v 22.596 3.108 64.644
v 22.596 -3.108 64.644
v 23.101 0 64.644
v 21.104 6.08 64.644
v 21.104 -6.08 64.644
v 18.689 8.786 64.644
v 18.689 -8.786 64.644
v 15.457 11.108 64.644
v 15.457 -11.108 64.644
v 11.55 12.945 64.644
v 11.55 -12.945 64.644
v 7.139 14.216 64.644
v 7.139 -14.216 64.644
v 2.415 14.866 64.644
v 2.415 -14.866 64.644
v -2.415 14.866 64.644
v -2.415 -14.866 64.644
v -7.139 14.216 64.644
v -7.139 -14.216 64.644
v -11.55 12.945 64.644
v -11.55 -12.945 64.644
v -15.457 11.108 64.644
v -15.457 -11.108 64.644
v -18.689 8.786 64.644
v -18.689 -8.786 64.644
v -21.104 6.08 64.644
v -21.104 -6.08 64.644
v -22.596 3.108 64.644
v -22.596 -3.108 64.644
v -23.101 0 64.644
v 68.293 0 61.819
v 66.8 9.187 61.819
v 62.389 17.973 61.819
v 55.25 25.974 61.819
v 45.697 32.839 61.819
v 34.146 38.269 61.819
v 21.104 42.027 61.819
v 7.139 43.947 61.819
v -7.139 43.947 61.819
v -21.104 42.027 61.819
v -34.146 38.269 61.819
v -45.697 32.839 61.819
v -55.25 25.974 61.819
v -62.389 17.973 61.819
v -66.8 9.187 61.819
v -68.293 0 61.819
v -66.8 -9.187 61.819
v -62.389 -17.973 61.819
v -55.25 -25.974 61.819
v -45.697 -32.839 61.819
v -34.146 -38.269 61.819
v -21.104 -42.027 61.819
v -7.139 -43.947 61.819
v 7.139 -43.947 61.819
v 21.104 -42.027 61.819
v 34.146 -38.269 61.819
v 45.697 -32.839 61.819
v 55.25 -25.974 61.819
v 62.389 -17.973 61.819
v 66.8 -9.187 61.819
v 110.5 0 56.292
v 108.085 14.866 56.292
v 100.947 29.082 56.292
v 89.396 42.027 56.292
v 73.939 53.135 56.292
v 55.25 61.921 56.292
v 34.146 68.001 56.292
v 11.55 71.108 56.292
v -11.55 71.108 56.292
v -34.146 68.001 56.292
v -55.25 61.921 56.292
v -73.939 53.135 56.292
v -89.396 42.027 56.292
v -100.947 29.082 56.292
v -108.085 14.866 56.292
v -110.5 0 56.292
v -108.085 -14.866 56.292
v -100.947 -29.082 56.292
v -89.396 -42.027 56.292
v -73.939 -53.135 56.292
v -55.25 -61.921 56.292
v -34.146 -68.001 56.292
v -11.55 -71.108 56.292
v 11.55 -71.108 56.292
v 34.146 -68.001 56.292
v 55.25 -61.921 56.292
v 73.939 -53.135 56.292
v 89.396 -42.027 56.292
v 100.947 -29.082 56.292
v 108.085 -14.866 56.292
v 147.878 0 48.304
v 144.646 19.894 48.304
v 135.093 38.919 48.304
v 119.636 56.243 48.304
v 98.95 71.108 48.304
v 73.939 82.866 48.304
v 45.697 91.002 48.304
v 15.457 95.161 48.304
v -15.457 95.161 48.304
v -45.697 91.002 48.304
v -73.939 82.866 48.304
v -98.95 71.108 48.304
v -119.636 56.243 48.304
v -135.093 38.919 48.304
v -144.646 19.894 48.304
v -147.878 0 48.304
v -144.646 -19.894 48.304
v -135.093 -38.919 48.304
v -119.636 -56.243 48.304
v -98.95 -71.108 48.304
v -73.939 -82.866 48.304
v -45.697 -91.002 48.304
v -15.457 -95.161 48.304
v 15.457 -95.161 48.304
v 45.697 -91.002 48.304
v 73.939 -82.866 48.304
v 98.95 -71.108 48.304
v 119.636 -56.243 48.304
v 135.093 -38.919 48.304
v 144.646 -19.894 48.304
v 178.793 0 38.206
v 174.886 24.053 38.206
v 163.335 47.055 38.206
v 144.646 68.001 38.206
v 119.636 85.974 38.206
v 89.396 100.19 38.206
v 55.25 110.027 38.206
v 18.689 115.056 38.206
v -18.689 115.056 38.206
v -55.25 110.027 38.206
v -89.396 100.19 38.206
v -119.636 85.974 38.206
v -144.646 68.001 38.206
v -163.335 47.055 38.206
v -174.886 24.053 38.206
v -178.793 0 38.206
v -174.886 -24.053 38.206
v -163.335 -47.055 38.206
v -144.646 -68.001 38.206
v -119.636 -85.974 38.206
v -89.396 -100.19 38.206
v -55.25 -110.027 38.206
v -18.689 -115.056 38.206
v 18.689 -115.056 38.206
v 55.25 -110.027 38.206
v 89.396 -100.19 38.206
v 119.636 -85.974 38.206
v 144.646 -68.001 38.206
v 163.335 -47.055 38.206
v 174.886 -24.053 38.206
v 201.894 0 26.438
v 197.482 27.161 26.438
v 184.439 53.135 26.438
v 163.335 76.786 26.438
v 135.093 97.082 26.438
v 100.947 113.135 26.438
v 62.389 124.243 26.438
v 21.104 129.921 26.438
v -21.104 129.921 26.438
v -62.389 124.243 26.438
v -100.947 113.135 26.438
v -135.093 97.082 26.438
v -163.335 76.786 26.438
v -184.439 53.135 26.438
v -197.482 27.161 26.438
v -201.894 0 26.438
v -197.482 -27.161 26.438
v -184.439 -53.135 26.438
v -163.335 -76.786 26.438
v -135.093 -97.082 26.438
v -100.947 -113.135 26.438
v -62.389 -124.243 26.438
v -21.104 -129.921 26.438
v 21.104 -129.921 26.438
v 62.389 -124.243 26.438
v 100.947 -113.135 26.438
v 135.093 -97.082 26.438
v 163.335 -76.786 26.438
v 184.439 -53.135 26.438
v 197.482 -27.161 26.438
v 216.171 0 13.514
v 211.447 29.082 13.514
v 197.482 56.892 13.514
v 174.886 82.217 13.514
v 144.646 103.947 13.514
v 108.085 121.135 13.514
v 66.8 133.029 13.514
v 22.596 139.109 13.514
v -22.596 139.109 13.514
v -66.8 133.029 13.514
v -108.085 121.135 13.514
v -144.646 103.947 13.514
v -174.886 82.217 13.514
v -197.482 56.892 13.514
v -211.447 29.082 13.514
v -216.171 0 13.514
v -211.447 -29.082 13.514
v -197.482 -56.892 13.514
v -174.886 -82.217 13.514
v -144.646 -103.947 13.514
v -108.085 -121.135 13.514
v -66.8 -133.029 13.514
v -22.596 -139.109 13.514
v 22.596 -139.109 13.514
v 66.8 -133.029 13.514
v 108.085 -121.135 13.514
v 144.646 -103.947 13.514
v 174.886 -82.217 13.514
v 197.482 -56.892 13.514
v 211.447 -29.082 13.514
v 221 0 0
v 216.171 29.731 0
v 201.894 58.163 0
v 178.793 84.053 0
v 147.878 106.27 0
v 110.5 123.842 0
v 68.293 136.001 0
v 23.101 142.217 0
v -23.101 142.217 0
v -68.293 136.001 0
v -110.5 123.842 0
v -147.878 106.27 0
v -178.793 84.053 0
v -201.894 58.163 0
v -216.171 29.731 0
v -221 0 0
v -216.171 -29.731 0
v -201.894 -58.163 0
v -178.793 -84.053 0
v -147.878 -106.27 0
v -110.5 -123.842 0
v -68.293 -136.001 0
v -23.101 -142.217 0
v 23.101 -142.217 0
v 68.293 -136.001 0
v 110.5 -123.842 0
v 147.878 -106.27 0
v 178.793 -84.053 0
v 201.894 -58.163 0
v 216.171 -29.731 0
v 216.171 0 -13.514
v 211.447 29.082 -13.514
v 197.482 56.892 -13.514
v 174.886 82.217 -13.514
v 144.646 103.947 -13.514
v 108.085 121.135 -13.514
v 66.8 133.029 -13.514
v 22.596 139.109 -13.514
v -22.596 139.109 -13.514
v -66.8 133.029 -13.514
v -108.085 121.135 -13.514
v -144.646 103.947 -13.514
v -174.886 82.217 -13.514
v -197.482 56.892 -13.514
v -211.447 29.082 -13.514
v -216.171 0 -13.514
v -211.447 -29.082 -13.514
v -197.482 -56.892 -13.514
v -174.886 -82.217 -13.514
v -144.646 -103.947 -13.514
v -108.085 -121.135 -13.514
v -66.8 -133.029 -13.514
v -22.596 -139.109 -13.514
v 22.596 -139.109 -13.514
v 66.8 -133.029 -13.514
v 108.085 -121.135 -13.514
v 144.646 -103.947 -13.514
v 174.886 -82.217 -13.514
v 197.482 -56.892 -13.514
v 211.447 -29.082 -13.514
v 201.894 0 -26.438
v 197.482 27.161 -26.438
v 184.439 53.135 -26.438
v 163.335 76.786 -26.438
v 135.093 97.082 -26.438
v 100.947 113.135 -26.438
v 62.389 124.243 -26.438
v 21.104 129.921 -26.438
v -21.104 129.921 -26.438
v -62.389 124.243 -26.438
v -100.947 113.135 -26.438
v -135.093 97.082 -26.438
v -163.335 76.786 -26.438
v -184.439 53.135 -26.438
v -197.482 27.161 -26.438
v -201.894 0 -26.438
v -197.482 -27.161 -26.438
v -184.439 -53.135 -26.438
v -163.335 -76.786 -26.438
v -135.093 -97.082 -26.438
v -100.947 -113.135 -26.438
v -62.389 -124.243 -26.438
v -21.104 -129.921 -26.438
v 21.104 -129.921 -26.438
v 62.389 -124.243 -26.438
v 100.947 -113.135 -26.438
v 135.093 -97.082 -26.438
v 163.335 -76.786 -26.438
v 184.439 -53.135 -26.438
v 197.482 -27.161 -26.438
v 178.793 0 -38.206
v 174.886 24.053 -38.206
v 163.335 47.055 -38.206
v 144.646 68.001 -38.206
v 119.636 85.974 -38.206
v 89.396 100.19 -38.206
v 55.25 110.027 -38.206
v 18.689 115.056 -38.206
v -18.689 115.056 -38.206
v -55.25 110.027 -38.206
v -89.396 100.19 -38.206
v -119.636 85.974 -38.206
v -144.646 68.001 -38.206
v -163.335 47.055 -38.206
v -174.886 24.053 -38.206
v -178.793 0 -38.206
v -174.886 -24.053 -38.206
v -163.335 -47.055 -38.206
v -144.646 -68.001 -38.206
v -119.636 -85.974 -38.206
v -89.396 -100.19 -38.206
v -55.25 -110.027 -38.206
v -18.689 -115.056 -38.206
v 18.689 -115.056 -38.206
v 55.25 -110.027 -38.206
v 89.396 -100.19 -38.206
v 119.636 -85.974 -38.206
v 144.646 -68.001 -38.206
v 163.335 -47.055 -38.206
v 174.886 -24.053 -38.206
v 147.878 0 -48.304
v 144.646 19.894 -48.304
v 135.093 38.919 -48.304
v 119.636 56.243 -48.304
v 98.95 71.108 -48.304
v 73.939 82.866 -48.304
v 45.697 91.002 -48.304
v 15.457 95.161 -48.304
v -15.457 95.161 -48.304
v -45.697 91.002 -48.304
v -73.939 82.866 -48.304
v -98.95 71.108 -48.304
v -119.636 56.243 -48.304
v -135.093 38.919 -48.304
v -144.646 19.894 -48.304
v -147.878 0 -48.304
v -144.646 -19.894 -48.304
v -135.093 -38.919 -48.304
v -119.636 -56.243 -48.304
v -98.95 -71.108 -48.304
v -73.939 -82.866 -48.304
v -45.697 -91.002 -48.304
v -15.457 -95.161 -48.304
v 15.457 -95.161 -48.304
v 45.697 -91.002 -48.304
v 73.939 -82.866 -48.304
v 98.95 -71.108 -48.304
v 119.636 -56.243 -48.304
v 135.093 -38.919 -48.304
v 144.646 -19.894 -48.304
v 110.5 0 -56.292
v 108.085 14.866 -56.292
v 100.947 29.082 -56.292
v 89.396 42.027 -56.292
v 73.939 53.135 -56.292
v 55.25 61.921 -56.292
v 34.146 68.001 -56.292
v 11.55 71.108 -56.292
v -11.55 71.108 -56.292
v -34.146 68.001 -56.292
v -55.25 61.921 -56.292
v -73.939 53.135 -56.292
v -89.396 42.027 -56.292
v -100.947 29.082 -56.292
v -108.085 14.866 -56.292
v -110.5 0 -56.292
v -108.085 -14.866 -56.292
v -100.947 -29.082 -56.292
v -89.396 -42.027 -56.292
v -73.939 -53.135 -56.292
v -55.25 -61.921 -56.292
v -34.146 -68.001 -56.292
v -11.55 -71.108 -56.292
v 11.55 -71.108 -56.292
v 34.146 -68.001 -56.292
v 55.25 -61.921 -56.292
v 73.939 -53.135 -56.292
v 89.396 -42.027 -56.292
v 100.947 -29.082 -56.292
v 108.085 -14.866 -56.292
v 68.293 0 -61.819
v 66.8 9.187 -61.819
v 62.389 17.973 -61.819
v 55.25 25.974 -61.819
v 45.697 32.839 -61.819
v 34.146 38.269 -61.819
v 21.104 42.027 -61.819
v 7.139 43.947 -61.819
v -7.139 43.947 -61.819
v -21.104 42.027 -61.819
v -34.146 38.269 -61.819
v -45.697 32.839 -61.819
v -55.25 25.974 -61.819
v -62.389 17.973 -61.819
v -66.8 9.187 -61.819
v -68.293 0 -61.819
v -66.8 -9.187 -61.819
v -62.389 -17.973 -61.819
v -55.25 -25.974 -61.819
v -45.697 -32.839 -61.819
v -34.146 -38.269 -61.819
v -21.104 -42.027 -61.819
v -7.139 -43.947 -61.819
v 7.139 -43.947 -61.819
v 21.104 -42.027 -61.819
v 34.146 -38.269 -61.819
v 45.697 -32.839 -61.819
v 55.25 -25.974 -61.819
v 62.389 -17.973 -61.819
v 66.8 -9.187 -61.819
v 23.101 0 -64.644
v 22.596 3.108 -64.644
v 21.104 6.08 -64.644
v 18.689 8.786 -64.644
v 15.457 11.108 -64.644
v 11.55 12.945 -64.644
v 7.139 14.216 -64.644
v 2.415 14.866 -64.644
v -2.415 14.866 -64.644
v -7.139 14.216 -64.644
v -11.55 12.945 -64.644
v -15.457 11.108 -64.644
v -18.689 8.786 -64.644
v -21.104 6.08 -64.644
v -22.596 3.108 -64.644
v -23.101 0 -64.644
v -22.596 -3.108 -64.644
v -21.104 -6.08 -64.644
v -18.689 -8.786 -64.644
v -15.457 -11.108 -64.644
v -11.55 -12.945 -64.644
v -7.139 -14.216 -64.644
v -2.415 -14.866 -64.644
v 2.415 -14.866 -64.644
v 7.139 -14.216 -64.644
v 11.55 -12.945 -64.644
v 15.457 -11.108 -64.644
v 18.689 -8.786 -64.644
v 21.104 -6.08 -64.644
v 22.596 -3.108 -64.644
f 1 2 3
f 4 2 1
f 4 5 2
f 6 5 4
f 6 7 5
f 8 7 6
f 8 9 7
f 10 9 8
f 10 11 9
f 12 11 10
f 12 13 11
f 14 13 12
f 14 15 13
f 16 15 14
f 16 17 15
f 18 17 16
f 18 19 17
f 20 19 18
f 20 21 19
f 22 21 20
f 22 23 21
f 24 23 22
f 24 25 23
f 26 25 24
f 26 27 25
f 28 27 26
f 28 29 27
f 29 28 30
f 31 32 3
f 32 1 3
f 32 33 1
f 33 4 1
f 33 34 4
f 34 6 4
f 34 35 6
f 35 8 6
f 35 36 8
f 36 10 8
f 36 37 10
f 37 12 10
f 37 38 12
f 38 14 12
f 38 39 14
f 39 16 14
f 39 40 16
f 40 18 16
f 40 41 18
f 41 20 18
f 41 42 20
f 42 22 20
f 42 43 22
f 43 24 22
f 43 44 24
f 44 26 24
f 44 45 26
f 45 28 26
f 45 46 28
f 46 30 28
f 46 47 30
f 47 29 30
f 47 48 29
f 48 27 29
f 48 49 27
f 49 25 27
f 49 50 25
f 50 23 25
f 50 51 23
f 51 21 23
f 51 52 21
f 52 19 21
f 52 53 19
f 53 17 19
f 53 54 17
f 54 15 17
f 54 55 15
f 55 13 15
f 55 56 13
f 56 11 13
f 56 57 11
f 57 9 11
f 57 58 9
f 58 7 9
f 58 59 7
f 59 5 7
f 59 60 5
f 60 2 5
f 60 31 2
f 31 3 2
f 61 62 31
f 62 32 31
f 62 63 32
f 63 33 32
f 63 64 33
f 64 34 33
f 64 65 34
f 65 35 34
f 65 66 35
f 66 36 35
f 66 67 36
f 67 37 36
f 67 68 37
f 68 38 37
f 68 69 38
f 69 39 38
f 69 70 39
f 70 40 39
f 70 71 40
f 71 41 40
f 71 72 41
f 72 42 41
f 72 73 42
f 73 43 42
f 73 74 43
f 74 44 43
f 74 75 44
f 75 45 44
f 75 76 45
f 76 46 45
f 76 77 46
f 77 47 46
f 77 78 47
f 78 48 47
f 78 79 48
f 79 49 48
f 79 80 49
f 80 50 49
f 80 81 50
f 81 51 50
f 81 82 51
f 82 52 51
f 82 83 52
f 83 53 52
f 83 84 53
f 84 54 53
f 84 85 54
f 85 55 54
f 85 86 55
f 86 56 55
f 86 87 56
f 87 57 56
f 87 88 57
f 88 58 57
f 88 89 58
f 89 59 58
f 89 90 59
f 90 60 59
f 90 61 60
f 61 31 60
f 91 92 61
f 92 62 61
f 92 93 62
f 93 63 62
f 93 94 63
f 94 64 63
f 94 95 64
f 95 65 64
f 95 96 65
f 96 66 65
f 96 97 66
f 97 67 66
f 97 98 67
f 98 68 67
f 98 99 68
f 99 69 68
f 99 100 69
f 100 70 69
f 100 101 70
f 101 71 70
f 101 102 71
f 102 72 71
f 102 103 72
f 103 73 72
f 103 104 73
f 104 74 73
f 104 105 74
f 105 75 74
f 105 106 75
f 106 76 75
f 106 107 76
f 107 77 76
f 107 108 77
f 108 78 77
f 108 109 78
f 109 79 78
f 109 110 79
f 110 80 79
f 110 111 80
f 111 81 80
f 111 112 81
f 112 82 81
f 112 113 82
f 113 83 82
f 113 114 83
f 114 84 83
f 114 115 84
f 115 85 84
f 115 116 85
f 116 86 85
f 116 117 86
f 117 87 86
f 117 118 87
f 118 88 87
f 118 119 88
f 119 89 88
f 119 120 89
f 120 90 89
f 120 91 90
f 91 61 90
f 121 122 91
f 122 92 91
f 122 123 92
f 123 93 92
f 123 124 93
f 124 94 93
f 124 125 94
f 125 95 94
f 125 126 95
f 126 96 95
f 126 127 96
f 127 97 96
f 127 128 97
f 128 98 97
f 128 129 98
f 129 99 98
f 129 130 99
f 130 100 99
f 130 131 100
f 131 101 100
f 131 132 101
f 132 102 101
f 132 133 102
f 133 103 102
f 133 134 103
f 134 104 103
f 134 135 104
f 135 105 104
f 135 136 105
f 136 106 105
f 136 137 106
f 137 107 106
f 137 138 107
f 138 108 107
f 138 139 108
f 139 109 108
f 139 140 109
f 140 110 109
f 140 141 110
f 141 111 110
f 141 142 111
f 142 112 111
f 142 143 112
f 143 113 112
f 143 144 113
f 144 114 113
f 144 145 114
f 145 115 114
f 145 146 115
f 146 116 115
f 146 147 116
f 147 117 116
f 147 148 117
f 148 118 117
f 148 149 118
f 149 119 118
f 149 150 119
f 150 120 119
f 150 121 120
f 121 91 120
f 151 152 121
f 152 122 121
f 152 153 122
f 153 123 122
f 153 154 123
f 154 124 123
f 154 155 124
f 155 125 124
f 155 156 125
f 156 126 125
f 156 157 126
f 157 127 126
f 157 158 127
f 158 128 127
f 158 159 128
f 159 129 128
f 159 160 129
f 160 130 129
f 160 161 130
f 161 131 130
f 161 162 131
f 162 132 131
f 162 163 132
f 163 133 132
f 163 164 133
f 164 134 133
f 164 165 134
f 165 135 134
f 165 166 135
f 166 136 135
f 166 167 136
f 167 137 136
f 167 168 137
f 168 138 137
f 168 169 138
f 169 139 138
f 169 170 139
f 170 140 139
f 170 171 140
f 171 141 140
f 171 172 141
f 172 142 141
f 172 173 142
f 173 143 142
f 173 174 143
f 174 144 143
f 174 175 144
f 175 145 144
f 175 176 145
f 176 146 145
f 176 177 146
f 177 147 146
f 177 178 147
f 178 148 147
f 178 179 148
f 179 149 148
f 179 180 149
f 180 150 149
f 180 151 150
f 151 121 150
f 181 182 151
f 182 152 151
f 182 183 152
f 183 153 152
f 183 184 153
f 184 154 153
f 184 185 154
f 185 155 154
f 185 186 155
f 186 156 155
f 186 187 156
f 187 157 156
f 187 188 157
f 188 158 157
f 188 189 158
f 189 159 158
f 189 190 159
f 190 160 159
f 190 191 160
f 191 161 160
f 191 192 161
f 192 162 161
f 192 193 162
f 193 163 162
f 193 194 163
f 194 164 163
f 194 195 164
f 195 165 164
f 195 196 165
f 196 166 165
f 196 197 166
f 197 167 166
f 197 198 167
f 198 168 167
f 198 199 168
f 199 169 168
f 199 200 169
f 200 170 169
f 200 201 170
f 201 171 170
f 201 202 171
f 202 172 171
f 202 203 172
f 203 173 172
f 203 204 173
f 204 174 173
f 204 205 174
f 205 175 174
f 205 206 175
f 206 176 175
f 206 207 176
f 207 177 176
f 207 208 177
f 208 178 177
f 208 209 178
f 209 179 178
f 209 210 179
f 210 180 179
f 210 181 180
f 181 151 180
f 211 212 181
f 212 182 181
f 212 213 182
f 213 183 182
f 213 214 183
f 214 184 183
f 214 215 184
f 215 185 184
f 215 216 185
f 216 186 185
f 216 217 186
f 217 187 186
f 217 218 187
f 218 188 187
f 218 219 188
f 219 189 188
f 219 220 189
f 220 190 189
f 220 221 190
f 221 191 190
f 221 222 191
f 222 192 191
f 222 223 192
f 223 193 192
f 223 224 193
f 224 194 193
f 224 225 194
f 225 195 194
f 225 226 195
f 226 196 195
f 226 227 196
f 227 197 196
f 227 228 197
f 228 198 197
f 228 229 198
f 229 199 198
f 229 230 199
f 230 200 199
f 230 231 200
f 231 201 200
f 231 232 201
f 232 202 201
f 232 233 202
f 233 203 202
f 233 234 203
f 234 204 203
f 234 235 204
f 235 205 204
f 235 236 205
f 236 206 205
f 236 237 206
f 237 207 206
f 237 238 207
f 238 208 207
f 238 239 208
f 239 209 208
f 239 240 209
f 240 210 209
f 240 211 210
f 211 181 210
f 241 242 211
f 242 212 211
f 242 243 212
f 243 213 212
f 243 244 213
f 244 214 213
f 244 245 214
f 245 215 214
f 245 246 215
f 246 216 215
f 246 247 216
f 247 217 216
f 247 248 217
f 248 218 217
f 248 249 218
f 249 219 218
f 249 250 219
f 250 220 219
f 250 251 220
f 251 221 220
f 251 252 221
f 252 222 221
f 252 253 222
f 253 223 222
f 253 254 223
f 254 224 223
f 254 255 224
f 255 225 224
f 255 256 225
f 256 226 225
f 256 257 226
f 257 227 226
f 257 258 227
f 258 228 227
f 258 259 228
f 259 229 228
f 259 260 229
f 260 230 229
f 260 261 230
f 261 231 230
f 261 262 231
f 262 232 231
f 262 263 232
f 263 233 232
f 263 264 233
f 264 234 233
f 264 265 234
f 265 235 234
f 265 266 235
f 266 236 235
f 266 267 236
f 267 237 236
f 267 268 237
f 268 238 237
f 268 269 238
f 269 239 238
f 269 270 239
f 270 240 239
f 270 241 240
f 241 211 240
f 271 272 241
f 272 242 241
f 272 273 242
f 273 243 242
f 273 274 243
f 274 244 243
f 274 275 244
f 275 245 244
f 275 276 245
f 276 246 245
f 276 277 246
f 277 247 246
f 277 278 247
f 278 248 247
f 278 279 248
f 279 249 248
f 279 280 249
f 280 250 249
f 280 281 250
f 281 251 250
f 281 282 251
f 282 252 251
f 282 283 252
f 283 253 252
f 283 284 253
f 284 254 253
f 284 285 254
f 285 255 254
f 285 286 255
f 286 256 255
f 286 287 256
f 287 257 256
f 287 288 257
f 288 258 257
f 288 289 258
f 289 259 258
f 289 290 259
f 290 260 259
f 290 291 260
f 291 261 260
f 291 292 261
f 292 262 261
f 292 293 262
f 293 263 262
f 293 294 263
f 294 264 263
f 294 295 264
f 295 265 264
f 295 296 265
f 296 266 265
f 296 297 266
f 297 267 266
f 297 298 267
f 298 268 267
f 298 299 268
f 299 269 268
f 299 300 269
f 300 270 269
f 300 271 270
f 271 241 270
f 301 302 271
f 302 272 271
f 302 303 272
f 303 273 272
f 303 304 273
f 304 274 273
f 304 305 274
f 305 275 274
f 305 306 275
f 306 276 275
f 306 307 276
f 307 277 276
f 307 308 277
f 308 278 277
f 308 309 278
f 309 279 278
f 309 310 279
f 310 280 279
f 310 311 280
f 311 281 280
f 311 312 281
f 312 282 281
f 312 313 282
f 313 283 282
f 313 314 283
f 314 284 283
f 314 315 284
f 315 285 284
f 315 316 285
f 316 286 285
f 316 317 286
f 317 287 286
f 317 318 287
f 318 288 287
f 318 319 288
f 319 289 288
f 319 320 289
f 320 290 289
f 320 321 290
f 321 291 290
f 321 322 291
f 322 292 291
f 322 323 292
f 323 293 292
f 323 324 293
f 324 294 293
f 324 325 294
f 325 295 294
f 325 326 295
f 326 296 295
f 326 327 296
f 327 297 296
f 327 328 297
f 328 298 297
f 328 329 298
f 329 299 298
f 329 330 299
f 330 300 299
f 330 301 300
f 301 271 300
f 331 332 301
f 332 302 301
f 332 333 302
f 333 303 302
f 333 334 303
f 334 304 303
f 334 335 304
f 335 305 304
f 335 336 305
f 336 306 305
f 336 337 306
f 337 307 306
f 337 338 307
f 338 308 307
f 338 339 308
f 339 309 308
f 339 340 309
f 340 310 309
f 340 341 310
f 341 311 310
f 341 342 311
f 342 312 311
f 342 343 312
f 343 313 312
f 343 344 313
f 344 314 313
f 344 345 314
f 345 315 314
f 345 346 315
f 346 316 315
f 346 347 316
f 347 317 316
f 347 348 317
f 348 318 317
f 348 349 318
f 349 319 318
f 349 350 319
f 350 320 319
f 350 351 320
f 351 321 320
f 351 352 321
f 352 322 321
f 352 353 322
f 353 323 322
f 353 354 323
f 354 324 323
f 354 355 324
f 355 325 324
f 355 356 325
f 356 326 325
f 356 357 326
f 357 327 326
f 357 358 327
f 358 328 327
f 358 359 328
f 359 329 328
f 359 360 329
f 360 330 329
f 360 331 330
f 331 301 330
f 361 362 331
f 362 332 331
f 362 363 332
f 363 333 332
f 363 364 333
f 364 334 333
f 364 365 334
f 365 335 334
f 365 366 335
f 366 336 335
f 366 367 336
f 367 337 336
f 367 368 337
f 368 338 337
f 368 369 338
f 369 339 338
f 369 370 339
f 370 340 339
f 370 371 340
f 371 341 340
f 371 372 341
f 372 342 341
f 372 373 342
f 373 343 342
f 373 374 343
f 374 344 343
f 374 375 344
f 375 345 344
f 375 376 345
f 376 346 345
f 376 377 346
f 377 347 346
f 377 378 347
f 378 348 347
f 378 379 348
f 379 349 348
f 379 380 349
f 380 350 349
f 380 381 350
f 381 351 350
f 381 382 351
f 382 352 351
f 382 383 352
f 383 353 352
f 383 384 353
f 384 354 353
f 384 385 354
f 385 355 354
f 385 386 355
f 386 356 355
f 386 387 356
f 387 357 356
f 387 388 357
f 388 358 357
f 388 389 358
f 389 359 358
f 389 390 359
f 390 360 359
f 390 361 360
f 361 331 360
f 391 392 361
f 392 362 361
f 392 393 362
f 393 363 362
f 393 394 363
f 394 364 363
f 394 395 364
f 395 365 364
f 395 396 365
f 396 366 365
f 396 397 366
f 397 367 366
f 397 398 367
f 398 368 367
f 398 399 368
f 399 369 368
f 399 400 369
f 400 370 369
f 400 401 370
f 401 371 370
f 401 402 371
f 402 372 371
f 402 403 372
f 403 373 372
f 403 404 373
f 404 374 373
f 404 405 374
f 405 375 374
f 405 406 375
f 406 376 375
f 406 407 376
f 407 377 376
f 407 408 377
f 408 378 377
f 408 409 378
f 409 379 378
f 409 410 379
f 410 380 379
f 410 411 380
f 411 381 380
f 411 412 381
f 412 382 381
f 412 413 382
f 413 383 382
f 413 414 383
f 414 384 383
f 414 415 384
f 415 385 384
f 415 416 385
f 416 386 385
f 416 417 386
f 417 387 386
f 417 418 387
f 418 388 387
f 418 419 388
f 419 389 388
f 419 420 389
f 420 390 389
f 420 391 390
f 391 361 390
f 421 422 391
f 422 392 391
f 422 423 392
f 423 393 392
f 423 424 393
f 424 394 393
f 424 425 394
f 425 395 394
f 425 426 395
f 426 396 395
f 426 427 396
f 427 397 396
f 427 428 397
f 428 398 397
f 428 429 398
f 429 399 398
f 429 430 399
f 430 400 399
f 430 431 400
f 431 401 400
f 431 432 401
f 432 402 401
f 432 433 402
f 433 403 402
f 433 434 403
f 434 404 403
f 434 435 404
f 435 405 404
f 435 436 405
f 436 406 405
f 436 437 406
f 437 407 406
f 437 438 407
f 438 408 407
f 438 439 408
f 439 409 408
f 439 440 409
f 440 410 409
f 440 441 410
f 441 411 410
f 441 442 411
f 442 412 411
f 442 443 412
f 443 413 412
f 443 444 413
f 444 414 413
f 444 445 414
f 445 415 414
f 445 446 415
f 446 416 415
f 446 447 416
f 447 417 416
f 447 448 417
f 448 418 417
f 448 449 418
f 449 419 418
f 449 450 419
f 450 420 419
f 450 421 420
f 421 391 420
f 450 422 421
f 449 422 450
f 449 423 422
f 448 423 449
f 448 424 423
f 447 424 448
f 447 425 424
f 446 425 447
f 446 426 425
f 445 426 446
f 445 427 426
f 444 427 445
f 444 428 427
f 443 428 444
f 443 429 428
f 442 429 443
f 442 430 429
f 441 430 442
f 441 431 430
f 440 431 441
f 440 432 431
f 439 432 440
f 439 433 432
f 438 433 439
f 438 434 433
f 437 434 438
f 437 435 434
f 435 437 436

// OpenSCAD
// Generated by SolidPython 1.0.1 on 2020-07-29 00:46:53


scale(v = [17, 11, 5]) {
	sphere(r = 13);
}
/***********************************************
*********      SolidPython code:      **********
************************************************
 
# import packages: SolidPython
from solid import *
from solid.utils import *
from itertools import chain, combinations, permutations


class Resize:

    def __init__(self, scad_file):
        self.scad_file = scad_file
        #self.scad_file = import_scad(scad_file)
        # cone/cylinder param:
        self.r1 = 0
        self.r2 = 0
        self.h = 0
        # rectangular prism param:
        self.w = 0
        self.l = 0
        # ellipse param:
        self.r = 0

    # import OpenScad code (file name corresponds to shape)


    # classify shape + parameters
    def assign(self, param1, param2, param3):
        if self.scad_file == 'cone.scad':
            self.r1 = param1
            self.r2 = param2
            self.h = param3
        elif self.scad_file == 'cylinder.scad':
            self.r1 = param1
            self.r2 = param2
            self.h = param3
        elif self.scad_file == 'rectangularPrism.scad':
            self.h = param1
            self.l = param2
            self.w = param3
        else:
            self.r = param1
            self.h = param2

    # resize parameters
    def iterate(self):
        x = range(3, 20, 2)
        i = 1
        if self.scad_file == 'cone.scad':
            tempList = list(permutations(x, 2))
            for temp in tempList:
                param1 = temp[0]
                param2 = temp[1]
                filepath = 'produced_scad_files/' + 'cone' + str(param1) + '_' + str(param2) + '_' + '.scad'
                scad_render_to_file(cylinder(h=param1, r1=param2, r2=0), filepath)

        elif self.scad_file == 'cylinder.scad':
            tempList = list(permutations(x, 3))
            for temp in tempList:
                param1 = temp[0]
                param2 = temp[1]
                filepath = 'produced_scad_files/' + 'cylinder' + str(param1) + '_' + str(param2) + '_' + '.scad'
                scad_render_to_file(cylinder(h=param1, r1=param2, r2=param2), filepath)

        elif self.scad_file == 'rectangularPrism.scad':
            tempList = list(permutations(x, 3))
            for temp in tempList:
                param1 = temp[0]
                param2 = temp[1]
                param3 = temp[2]
                filepath = 'produced_scad_files/' + 'rectangularPrism' + str(param1) + '_' + str(param2) + '_' + str(
                    param3) + '.scad'
                scad_render_to_file(cube(size=(param1, param2, param3)), filepath)

        elif self.scad_file == 'ellipse.scad':
            tempList = list(permutations(x, 4))
            for temp in tempList:
                param1 = temp[0]
                param2 = temp[1]
                param3 = temp[2]
                param4 = temp[3]
                filepath = 'produced_scad_files/' + 'ellipse' + str(param1) + '_' + str(param2) + '_' + str(param3) + '_' + str(param4) + '.scad'
                scad_render_to_file(scale([param1, param2, param3])(sphere(r=param4)), filepath)

    def render_to_scadfile(self):
        scad_render_to_file(scad, 'example.scad') 
 
************************************************/
